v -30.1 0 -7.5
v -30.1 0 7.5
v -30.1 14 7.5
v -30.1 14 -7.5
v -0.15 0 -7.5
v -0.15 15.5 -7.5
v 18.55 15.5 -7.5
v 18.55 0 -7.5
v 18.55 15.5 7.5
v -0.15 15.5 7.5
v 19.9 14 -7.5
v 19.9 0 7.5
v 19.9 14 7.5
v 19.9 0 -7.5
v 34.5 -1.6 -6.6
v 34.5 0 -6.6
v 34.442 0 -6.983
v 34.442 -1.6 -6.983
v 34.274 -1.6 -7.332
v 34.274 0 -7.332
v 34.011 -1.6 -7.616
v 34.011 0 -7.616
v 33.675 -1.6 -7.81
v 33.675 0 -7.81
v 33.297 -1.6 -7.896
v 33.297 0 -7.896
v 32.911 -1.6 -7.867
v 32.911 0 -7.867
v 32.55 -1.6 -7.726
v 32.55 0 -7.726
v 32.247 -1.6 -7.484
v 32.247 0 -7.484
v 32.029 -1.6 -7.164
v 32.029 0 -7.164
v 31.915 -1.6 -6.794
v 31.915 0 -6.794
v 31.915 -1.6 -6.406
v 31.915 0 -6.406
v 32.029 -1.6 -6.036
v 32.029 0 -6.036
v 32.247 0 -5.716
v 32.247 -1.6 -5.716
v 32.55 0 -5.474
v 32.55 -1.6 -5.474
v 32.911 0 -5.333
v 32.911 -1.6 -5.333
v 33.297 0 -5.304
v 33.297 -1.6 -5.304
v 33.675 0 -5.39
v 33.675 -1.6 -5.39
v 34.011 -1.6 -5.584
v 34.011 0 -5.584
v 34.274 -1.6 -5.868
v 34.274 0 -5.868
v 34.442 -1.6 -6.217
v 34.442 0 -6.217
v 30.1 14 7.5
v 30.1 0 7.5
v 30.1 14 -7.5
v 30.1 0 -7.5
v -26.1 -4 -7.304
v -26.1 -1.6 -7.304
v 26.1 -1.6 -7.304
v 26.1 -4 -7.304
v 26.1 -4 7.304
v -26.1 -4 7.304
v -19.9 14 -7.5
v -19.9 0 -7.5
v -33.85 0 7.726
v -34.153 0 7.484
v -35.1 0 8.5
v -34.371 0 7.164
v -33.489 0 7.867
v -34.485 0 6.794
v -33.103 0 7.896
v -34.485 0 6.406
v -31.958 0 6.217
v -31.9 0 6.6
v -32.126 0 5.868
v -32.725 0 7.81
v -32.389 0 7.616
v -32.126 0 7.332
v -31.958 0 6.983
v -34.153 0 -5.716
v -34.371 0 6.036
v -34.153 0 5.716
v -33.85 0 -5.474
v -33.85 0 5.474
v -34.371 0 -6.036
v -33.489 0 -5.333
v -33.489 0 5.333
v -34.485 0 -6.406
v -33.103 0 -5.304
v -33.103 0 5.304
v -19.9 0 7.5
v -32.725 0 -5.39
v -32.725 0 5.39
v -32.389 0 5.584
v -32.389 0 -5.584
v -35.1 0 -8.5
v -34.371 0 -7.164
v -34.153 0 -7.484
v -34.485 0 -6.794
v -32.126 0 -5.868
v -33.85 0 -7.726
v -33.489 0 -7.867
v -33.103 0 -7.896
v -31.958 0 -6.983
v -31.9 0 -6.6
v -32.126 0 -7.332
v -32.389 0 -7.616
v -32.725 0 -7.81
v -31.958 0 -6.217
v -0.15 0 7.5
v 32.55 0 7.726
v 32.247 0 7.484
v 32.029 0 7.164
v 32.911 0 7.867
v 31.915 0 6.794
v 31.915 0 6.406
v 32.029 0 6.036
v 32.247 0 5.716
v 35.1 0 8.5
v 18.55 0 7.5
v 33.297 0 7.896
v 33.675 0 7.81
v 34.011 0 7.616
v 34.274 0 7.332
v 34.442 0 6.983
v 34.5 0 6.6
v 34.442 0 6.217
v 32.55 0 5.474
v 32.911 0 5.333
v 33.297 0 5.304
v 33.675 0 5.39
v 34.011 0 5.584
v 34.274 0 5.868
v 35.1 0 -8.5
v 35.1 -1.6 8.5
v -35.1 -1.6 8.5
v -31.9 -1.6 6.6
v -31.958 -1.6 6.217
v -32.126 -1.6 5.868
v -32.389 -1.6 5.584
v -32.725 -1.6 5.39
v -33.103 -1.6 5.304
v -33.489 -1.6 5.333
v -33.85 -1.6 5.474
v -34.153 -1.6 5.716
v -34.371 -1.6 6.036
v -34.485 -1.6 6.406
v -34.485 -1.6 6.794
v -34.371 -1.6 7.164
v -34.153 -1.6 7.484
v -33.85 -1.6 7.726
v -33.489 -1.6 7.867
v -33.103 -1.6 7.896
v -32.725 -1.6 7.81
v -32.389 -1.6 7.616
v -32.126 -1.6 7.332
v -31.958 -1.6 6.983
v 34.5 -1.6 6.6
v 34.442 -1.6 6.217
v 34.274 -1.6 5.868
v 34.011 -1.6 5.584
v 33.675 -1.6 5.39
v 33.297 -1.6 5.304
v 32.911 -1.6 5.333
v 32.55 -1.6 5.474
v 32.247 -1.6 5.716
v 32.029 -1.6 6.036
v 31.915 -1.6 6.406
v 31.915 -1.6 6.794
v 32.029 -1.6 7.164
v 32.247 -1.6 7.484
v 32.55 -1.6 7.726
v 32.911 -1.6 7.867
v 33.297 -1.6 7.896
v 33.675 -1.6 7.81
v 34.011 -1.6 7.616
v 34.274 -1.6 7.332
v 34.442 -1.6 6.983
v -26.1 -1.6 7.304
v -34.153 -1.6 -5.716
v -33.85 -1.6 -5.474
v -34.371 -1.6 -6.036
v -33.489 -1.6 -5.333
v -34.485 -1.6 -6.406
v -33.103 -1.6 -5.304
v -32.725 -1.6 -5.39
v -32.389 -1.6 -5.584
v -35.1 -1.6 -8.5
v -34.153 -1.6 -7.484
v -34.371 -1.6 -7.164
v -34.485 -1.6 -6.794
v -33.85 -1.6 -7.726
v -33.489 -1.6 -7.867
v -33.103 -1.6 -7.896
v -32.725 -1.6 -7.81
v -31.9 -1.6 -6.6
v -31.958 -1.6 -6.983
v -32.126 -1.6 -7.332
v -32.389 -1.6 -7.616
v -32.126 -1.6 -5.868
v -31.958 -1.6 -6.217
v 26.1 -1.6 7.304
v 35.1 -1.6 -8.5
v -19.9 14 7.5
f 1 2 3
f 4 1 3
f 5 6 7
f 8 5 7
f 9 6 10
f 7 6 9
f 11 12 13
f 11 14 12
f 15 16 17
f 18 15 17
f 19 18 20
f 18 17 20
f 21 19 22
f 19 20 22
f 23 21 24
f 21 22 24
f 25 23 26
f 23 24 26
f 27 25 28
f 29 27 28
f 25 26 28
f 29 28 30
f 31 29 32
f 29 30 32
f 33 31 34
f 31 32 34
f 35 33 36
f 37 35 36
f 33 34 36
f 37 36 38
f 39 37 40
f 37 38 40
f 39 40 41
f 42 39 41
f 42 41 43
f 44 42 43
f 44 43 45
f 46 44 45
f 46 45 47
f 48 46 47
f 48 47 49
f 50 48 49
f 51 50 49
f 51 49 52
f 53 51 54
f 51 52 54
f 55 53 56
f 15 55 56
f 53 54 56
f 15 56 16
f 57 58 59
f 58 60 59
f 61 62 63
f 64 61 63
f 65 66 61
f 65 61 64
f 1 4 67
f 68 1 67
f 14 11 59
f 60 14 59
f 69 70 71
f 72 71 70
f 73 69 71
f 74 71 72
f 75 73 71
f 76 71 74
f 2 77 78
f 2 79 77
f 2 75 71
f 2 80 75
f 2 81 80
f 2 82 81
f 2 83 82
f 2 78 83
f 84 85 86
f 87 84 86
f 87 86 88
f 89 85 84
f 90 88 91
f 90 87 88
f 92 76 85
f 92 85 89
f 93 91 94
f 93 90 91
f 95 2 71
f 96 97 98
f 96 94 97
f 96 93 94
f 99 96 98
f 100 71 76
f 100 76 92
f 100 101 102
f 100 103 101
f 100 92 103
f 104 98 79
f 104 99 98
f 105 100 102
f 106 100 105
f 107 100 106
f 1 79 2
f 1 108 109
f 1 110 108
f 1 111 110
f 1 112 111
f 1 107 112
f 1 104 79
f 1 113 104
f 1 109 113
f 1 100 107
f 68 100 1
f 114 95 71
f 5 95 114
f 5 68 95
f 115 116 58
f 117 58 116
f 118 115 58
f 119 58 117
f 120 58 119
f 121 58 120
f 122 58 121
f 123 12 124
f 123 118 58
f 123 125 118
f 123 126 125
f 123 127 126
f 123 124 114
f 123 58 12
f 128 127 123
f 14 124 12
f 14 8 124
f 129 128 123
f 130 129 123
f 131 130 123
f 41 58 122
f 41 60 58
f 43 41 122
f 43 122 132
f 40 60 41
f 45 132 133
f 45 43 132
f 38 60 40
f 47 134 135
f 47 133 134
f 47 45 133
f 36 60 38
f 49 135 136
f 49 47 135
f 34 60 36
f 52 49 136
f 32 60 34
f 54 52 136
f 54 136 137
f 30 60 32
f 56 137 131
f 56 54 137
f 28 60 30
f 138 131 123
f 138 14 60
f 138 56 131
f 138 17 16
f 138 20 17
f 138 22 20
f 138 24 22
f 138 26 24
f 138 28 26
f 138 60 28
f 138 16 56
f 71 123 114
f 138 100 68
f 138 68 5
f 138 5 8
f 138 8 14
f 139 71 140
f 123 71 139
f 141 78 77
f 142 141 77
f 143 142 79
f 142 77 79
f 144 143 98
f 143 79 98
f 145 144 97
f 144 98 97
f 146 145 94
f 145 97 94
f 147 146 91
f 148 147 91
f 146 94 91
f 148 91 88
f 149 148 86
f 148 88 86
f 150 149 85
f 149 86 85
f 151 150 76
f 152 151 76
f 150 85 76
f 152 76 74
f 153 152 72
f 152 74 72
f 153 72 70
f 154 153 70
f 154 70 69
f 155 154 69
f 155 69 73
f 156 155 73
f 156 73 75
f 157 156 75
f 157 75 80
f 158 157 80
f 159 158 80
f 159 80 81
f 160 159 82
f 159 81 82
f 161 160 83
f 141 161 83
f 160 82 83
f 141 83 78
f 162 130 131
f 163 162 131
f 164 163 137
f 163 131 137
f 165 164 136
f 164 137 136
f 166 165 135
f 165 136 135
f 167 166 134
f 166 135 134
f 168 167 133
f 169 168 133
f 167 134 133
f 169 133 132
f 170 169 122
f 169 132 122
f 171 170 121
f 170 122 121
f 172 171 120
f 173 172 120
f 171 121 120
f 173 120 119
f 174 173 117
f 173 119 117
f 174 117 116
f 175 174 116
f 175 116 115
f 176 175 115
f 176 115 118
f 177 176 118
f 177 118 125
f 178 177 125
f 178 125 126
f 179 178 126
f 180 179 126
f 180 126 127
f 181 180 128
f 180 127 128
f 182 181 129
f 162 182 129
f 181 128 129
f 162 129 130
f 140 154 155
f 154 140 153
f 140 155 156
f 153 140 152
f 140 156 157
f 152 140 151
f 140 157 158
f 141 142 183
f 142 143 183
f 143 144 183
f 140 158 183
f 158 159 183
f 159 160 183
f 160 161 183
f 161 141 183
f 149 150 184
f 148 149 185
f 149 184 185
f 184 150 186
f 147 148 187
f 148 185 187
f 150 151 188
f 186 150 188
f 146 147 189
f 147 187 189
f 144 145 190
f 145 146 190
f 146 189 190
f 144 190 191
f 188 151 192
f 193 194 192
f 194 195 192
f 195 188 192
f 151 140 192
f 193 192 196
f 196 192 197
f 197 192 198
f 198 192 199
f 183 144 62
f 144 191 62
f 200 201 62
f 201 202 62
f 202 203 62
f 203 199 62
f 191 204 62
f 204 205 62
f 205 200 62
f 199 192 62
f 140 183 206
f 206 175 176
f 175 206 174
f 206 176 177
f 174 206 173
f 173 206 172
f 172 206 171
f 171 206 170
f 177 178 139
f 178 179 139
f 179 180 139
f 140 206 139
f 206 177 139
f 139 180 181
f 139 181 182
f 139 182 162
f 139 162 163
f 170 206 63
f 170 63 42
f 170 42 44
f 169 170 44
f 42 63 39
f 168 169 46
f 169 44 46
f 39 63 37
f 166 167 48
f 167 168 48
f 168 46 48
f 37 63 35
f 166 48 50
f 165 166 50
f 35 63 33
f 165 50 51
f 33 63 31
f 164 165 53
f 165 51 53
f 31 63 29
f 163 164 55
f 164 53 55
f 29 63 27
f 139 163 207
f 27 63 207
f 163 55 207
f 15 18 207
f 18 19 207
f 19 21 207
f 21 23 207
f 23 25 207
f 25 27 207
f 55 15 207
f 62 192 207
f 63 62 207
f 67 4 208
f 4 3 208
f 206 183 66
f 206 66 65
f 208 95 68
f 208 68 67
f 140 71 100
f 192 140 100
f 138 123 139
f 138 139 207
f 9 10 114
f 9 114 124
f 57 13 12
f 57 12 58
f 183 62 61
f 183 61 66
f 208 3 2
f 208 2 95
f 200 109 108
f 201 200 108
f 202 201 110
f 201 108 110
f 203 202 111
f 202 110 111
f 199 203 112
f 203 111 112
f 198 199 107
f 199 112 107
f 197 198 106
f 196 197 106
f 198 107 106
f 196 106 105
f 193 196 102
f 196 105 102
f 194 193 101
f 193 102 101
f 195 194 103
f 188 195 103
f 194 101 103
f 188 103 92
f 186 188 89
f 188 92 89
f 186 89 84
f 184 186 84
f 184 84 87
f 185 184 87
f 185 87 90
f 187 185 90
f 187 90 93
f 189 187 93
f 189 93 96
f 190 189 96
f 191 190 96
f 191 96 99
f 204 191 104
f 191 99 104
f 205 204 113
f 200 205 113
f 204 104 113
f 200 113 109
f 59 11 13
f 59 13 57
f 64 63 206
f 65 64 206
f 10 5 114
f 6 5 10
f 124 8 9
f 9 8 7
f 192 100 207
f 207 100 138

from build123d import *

# Parameters (mm, degrees)
SKETCH1_W           = 70.2
SKETCH1_H           = 17
SKETCH1_R           = 1.3
BOSS_EXTRUDE1_DEPTH = 1.6
SKETCH2_W           = 18.7
SKETCH2_H           = 15.5
SKETCH2_W_2         = 10.2
SKETCH2_H_2         = 14
BOSS_EXTRUDE2_DEPTH = 7.5
SKETCH3_W           = 52.2
SKETCH3_H           = 14.607054818
BOSS_EXTRUDE3_DEPTH = 2.4


with BuildPart() as part:
    # Sketch1 → Boss-Extrude1 (new body)
    with BuildSketch(Plane(origin=(0, 0, 0), x_dir=(1, 0, 0), z_dir=(0, 1, 0))):
        Rectangle(SKETCH1_W, SKETCH1_H)
        with Locations((-33.2, 6.6)):
            Circle(SKETCH1_R, mode=Mode.SUBTRACT)
        with Locations((33.2, 6.6)):
            Circle(SKETCH1_R, mode=Mode.SUBTRACT)
        with Locations((33.2, -6.6)):
            Circle(SKETCH1_R, mode=Mode.SUBTRACT)
        with Locations((-33.2, -6.6)):
            Circle(SKETCH1_R, mode=Mode.SUBTRACT)
    extrude(amount=-BOSS_EXTRUDE1_DEPTH)

    # Sketch2 → Boss-Extrude2 (add, symmetric)
    with BuildSketch(Plane.XY):
        with Locations((9.2, 7.75)):
            Rectangle(SKETCH2_W, SKETCH2_H)
        with Locations((25, 7)):
            Rectangle(SKETCH2_W_2, SKETCH2_H_2)
        with Locations((-25, 7)):
            Rectangle(SKETCH2_W_2, SKETCH2_H_2)
    extrude(amount=BOSS_EXTRUDE2_DEPTH, both=True)

    # Sketch3 → Boss-Extrude3 (add)
    with BuildSketch(Plane.XZ.offset(1.6)):
        Rectangle(SKETCH3_W, SKETCH3_H)
    extrude(amount=BOSS_EXTRUDE3_DEPTH)


solid = part.part
